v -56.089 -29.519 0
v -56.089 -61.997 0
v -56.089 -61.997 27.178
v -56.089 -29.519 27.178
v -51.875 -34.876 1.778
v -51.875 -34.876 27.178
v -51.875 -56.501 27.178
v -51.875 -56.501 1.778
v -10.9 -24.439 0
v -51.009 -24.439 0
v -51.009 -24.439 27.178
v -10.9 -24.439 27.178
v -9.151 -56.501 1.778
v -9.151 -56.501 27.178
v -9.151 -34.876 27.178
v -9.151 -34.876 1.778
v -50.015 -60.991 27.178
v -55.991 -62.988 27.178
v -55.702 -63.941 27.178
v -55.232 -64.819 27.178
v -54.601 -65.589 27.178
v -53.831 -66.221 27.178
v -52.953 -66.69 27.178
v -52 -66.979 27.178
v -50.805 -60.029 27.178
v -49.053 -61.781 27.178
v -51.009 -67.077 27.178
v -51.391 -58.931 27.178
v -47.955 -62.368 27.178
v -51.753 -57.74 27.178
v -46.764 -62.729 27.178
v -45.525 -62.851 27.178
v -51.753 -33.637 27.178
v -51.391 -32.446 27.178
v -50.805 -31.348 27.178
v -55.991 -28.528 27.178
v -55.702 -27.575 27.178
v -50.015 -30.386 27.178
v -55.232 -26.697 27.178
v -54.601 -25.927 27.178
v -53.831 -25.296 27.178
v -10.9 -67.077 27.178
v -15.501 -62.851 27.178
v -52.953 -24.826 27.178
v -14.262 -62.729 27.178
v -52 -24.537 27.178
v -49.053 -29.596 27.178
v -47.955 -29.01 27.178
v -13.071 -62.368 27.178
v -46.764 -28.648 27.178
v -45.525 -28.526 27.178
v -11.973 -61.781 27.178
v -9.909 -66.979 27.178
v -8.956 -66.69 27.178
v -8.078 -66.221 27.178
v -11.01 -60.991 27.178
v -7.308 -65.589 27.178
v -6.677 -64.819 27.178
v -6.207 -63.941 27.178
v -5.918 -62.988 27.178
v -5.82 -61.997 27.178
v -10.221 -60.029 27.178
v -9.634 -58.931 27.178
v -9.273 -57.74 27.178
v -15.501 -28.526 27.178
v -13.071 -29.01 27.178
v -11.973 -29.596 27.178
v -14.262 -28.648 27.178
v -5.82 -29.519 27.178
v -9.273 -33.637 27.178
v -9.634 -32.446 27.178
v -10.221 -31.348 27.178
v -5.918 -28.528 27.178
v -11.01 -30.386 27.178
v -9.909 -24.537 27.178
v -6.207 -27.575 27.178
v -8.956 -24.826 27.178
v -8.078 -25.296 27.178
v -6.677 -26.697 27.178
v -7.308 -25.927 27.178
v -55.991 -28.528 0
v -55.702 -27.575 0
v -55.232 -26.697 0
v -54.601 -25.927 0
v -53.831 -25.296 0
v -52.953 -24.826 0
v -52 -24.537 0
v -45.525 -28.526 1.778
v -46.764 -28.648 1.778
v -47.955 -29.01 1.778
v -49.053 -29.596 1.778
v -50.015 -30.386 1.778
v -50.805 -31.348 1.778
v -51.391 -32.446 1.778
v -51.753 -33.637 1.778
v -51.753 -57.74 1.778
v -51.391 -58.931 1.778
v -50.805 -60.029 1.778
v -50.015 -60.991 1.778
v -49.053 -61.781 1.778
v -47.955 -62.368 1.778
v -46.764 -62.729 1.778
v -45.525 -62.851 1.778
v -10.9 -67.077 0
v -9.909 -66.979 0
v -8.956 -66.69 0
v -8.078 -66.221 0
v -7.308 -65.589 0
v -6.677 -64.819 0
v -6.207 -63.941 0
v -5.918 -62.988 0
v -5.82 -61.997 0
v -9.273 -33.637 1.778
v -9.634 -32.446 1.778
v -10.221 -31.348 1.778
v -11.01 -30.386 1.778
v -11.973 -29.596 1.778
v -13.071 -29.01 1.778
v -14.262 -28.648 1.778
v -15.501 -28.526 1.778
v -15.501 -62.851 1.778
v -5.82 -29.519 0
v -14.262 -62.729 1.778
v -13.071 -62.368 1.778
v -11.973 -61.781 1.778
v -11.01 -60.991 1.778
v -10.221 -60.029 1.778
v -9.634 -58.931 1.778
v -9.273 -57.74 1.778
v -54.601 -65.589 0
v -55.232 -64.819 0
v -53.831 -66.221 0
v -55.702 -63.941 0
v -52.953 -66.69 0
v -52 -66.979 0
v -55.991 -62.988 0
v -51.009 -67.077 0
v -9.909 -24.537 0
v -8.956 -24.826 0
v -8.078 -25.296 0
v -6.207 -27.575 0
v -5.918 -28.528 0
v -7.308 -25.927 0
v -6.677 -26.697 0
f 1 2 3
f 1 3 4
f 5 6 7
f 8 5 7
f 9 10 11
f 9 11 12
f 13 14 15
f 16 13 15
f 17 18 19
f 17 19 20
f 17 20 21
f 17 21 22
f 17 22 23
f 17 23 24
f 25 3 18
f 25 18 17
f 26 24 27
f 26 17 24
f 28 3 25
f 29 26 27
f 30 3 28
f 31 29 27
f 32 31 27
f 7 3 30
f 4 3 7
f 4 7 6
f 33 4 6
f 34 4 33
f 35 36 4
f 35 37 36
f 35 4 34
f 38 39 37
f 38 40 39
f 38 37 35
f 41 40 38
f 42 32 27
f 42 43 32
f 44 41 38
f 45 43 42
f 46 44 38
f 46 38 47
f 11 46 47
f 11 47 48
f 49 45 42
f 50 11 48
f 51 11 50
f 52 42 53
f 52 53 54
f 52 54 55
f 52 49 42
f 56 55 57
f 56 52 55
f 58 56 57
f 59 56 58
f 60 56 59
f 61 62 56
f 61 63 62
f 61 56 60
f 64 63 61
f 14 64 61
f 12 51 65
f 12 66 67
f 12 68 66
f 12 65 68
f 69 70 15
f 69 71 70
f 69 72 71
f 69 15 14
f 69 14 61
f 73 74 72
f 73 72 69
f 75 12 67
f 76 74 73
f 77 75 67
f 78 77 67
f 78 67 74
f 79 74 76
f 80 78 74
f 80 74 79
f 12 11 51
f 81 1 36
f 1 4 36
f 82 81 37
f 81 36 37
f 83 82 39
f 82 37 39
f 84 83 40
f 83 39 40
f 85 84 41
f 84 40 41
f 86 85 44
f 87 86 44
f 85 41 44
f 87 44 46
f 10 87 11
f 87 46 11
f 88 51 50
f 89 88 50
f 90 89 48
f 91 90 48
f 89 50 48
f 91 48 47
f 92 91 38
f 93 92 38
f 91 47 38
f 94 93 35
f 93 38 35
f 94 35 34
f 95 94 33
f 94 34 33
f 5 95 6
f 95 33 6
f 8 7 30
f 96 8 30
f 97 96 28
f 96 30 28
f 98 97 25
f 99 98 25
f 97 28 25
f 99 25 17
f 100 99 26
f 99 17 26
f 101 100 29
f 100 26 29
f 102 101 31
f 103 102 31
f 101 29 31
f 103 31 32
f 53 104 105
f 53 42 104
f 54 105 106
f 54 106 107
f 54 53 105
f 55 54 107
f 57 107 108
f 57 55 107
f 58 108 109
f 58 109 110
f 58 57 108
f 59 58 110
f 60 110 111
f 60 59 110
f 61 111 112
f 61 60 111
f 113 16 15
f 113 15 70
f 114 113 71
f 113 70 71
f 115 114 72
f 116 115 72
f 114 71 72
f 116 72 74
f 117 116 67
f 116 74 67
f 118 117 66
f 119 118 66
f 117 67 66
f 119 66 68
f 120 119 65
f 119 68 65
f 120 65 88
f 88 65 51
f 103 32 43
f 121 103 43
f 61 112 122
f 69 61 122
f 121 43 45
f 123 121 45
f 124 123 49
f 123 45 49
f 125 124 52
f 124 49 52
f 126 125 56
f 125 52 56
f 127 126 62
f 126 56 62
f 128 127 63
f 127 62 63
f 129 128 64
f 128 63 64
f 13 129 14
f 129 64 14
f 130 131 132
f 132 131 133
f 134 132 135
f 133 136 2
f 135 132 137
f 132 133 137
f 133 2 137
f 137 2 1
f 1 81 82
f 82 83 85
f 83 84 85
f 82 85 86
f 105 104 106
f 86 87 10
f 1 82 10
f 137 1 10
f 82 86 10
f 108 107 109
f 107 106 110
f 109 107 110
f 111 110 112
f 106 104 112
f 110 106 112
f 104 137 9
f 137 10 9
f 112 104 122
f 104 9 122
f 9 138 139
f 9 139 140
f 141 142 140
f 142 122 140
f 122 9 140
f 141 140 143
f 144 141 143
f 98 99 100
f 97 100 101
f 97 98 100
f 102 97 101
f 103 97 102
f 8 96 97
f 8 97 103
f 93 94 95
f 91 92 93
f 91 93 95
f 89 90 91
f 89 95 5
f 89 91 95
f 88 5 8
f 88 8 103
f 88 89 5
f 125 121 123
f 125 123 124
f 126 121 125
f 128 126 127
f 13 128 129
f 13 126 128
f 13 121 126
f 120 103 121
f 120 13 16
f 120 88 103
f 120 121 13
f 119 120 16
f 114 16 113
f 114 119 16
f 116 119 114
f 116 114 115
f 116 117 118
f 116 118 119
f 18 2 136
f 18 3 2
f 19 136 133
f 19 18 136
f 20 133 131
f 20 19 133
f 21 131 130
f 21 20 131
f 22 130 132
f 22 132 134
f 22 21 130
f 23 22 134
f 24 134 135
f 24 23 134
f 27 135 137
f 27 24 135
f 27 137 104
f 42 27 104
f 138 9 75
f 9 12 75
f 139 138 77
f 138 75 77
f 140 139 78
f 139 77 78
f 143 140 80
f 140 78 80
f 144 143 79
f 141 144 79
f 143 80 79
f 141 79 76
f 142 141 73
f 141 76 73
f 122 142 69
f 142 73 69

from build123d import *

# Parameters (mm, degrees)
F0_W     = 50.268072
F0_H     = 42.637728
F1_DEPTH = 27.178
F3_DEPTH = 25.4
F4_R     = 5.08
F5_R     = 5.08
F6_R     = 5.08
F7_R     = 5.08


with BuildPart() as f1:
    # F0 (on Top) → F1 (new body)
    with BuildSketch(Plane.XY):
        with Locations((-30.954471, -45.758236)):
            Rectangle(F0_W, F0_H)
    extrude(amount=F1_DEPTH)

    # F2 (on face) → F3 (cut)
    with BuildSketch(Plane.XY.offset(27.178)):
        with BuildLine():
            Line((-15.500558, -28.52626), (-45.524775, -28.52626))
            ThreePointArc((-45.524775, -28.52626), (-50.014904, -30.386132), (-51.874775, -34.87626))
            Line((-51.874775, -34.87626), (-51.874775, -56.50087))
            ThreePointArc((-51.874775, -56.50087), (-50.014904, -60.990998), (-45.524775, -62.85087))
            Line((-45.524775, -62.85087), (-15.500558, -62.85087))
            ThreePointArc((-15.500558, -62.85087), (-11.01043, -60.990998), (-9.150558, -56.50087))
            Line((-9.150558, -56.50087), (-9.150558, -34.87626))
            ThreePointArc((-9.150558, -34.87626), (-11.01043, -30.386132), (-15.500558, -28.52626))
        make_face()
    extrude(amount=-F3_DEPTH, mode=Mode.SUBTRACT)

    # F4
    f4_edges = [f1.edges().sort_by_distance(p)[0] for p in [
        (-56.088507, -67.0771, 13.589),
    ]]
    fillet(f4_edges, radius=F4_R)

    # F5
    f5_edges = [f1.edges().sort_by_distance(p)[0] for p in [
        (-5.820435, -67.0771, 13.589),
    ]]
    fillet(f5_edges, radius=F5_R)

    # F6
    f6_edges = [f1.edges().sort_by_distance(p)[0] for p in [
        (-56.088507, -24.439372, 13.589),
    ]]
    fillet(f6_edges, radius=F6_R)

    # F7
    f7_edges = [f1.edges().sort_by_distance(p)[0] for p in [
        (-5.820435, -24.439372, 13.589),
    ]]
    fillet(f7_edges, radius=F7_R)


solid = f1.part
